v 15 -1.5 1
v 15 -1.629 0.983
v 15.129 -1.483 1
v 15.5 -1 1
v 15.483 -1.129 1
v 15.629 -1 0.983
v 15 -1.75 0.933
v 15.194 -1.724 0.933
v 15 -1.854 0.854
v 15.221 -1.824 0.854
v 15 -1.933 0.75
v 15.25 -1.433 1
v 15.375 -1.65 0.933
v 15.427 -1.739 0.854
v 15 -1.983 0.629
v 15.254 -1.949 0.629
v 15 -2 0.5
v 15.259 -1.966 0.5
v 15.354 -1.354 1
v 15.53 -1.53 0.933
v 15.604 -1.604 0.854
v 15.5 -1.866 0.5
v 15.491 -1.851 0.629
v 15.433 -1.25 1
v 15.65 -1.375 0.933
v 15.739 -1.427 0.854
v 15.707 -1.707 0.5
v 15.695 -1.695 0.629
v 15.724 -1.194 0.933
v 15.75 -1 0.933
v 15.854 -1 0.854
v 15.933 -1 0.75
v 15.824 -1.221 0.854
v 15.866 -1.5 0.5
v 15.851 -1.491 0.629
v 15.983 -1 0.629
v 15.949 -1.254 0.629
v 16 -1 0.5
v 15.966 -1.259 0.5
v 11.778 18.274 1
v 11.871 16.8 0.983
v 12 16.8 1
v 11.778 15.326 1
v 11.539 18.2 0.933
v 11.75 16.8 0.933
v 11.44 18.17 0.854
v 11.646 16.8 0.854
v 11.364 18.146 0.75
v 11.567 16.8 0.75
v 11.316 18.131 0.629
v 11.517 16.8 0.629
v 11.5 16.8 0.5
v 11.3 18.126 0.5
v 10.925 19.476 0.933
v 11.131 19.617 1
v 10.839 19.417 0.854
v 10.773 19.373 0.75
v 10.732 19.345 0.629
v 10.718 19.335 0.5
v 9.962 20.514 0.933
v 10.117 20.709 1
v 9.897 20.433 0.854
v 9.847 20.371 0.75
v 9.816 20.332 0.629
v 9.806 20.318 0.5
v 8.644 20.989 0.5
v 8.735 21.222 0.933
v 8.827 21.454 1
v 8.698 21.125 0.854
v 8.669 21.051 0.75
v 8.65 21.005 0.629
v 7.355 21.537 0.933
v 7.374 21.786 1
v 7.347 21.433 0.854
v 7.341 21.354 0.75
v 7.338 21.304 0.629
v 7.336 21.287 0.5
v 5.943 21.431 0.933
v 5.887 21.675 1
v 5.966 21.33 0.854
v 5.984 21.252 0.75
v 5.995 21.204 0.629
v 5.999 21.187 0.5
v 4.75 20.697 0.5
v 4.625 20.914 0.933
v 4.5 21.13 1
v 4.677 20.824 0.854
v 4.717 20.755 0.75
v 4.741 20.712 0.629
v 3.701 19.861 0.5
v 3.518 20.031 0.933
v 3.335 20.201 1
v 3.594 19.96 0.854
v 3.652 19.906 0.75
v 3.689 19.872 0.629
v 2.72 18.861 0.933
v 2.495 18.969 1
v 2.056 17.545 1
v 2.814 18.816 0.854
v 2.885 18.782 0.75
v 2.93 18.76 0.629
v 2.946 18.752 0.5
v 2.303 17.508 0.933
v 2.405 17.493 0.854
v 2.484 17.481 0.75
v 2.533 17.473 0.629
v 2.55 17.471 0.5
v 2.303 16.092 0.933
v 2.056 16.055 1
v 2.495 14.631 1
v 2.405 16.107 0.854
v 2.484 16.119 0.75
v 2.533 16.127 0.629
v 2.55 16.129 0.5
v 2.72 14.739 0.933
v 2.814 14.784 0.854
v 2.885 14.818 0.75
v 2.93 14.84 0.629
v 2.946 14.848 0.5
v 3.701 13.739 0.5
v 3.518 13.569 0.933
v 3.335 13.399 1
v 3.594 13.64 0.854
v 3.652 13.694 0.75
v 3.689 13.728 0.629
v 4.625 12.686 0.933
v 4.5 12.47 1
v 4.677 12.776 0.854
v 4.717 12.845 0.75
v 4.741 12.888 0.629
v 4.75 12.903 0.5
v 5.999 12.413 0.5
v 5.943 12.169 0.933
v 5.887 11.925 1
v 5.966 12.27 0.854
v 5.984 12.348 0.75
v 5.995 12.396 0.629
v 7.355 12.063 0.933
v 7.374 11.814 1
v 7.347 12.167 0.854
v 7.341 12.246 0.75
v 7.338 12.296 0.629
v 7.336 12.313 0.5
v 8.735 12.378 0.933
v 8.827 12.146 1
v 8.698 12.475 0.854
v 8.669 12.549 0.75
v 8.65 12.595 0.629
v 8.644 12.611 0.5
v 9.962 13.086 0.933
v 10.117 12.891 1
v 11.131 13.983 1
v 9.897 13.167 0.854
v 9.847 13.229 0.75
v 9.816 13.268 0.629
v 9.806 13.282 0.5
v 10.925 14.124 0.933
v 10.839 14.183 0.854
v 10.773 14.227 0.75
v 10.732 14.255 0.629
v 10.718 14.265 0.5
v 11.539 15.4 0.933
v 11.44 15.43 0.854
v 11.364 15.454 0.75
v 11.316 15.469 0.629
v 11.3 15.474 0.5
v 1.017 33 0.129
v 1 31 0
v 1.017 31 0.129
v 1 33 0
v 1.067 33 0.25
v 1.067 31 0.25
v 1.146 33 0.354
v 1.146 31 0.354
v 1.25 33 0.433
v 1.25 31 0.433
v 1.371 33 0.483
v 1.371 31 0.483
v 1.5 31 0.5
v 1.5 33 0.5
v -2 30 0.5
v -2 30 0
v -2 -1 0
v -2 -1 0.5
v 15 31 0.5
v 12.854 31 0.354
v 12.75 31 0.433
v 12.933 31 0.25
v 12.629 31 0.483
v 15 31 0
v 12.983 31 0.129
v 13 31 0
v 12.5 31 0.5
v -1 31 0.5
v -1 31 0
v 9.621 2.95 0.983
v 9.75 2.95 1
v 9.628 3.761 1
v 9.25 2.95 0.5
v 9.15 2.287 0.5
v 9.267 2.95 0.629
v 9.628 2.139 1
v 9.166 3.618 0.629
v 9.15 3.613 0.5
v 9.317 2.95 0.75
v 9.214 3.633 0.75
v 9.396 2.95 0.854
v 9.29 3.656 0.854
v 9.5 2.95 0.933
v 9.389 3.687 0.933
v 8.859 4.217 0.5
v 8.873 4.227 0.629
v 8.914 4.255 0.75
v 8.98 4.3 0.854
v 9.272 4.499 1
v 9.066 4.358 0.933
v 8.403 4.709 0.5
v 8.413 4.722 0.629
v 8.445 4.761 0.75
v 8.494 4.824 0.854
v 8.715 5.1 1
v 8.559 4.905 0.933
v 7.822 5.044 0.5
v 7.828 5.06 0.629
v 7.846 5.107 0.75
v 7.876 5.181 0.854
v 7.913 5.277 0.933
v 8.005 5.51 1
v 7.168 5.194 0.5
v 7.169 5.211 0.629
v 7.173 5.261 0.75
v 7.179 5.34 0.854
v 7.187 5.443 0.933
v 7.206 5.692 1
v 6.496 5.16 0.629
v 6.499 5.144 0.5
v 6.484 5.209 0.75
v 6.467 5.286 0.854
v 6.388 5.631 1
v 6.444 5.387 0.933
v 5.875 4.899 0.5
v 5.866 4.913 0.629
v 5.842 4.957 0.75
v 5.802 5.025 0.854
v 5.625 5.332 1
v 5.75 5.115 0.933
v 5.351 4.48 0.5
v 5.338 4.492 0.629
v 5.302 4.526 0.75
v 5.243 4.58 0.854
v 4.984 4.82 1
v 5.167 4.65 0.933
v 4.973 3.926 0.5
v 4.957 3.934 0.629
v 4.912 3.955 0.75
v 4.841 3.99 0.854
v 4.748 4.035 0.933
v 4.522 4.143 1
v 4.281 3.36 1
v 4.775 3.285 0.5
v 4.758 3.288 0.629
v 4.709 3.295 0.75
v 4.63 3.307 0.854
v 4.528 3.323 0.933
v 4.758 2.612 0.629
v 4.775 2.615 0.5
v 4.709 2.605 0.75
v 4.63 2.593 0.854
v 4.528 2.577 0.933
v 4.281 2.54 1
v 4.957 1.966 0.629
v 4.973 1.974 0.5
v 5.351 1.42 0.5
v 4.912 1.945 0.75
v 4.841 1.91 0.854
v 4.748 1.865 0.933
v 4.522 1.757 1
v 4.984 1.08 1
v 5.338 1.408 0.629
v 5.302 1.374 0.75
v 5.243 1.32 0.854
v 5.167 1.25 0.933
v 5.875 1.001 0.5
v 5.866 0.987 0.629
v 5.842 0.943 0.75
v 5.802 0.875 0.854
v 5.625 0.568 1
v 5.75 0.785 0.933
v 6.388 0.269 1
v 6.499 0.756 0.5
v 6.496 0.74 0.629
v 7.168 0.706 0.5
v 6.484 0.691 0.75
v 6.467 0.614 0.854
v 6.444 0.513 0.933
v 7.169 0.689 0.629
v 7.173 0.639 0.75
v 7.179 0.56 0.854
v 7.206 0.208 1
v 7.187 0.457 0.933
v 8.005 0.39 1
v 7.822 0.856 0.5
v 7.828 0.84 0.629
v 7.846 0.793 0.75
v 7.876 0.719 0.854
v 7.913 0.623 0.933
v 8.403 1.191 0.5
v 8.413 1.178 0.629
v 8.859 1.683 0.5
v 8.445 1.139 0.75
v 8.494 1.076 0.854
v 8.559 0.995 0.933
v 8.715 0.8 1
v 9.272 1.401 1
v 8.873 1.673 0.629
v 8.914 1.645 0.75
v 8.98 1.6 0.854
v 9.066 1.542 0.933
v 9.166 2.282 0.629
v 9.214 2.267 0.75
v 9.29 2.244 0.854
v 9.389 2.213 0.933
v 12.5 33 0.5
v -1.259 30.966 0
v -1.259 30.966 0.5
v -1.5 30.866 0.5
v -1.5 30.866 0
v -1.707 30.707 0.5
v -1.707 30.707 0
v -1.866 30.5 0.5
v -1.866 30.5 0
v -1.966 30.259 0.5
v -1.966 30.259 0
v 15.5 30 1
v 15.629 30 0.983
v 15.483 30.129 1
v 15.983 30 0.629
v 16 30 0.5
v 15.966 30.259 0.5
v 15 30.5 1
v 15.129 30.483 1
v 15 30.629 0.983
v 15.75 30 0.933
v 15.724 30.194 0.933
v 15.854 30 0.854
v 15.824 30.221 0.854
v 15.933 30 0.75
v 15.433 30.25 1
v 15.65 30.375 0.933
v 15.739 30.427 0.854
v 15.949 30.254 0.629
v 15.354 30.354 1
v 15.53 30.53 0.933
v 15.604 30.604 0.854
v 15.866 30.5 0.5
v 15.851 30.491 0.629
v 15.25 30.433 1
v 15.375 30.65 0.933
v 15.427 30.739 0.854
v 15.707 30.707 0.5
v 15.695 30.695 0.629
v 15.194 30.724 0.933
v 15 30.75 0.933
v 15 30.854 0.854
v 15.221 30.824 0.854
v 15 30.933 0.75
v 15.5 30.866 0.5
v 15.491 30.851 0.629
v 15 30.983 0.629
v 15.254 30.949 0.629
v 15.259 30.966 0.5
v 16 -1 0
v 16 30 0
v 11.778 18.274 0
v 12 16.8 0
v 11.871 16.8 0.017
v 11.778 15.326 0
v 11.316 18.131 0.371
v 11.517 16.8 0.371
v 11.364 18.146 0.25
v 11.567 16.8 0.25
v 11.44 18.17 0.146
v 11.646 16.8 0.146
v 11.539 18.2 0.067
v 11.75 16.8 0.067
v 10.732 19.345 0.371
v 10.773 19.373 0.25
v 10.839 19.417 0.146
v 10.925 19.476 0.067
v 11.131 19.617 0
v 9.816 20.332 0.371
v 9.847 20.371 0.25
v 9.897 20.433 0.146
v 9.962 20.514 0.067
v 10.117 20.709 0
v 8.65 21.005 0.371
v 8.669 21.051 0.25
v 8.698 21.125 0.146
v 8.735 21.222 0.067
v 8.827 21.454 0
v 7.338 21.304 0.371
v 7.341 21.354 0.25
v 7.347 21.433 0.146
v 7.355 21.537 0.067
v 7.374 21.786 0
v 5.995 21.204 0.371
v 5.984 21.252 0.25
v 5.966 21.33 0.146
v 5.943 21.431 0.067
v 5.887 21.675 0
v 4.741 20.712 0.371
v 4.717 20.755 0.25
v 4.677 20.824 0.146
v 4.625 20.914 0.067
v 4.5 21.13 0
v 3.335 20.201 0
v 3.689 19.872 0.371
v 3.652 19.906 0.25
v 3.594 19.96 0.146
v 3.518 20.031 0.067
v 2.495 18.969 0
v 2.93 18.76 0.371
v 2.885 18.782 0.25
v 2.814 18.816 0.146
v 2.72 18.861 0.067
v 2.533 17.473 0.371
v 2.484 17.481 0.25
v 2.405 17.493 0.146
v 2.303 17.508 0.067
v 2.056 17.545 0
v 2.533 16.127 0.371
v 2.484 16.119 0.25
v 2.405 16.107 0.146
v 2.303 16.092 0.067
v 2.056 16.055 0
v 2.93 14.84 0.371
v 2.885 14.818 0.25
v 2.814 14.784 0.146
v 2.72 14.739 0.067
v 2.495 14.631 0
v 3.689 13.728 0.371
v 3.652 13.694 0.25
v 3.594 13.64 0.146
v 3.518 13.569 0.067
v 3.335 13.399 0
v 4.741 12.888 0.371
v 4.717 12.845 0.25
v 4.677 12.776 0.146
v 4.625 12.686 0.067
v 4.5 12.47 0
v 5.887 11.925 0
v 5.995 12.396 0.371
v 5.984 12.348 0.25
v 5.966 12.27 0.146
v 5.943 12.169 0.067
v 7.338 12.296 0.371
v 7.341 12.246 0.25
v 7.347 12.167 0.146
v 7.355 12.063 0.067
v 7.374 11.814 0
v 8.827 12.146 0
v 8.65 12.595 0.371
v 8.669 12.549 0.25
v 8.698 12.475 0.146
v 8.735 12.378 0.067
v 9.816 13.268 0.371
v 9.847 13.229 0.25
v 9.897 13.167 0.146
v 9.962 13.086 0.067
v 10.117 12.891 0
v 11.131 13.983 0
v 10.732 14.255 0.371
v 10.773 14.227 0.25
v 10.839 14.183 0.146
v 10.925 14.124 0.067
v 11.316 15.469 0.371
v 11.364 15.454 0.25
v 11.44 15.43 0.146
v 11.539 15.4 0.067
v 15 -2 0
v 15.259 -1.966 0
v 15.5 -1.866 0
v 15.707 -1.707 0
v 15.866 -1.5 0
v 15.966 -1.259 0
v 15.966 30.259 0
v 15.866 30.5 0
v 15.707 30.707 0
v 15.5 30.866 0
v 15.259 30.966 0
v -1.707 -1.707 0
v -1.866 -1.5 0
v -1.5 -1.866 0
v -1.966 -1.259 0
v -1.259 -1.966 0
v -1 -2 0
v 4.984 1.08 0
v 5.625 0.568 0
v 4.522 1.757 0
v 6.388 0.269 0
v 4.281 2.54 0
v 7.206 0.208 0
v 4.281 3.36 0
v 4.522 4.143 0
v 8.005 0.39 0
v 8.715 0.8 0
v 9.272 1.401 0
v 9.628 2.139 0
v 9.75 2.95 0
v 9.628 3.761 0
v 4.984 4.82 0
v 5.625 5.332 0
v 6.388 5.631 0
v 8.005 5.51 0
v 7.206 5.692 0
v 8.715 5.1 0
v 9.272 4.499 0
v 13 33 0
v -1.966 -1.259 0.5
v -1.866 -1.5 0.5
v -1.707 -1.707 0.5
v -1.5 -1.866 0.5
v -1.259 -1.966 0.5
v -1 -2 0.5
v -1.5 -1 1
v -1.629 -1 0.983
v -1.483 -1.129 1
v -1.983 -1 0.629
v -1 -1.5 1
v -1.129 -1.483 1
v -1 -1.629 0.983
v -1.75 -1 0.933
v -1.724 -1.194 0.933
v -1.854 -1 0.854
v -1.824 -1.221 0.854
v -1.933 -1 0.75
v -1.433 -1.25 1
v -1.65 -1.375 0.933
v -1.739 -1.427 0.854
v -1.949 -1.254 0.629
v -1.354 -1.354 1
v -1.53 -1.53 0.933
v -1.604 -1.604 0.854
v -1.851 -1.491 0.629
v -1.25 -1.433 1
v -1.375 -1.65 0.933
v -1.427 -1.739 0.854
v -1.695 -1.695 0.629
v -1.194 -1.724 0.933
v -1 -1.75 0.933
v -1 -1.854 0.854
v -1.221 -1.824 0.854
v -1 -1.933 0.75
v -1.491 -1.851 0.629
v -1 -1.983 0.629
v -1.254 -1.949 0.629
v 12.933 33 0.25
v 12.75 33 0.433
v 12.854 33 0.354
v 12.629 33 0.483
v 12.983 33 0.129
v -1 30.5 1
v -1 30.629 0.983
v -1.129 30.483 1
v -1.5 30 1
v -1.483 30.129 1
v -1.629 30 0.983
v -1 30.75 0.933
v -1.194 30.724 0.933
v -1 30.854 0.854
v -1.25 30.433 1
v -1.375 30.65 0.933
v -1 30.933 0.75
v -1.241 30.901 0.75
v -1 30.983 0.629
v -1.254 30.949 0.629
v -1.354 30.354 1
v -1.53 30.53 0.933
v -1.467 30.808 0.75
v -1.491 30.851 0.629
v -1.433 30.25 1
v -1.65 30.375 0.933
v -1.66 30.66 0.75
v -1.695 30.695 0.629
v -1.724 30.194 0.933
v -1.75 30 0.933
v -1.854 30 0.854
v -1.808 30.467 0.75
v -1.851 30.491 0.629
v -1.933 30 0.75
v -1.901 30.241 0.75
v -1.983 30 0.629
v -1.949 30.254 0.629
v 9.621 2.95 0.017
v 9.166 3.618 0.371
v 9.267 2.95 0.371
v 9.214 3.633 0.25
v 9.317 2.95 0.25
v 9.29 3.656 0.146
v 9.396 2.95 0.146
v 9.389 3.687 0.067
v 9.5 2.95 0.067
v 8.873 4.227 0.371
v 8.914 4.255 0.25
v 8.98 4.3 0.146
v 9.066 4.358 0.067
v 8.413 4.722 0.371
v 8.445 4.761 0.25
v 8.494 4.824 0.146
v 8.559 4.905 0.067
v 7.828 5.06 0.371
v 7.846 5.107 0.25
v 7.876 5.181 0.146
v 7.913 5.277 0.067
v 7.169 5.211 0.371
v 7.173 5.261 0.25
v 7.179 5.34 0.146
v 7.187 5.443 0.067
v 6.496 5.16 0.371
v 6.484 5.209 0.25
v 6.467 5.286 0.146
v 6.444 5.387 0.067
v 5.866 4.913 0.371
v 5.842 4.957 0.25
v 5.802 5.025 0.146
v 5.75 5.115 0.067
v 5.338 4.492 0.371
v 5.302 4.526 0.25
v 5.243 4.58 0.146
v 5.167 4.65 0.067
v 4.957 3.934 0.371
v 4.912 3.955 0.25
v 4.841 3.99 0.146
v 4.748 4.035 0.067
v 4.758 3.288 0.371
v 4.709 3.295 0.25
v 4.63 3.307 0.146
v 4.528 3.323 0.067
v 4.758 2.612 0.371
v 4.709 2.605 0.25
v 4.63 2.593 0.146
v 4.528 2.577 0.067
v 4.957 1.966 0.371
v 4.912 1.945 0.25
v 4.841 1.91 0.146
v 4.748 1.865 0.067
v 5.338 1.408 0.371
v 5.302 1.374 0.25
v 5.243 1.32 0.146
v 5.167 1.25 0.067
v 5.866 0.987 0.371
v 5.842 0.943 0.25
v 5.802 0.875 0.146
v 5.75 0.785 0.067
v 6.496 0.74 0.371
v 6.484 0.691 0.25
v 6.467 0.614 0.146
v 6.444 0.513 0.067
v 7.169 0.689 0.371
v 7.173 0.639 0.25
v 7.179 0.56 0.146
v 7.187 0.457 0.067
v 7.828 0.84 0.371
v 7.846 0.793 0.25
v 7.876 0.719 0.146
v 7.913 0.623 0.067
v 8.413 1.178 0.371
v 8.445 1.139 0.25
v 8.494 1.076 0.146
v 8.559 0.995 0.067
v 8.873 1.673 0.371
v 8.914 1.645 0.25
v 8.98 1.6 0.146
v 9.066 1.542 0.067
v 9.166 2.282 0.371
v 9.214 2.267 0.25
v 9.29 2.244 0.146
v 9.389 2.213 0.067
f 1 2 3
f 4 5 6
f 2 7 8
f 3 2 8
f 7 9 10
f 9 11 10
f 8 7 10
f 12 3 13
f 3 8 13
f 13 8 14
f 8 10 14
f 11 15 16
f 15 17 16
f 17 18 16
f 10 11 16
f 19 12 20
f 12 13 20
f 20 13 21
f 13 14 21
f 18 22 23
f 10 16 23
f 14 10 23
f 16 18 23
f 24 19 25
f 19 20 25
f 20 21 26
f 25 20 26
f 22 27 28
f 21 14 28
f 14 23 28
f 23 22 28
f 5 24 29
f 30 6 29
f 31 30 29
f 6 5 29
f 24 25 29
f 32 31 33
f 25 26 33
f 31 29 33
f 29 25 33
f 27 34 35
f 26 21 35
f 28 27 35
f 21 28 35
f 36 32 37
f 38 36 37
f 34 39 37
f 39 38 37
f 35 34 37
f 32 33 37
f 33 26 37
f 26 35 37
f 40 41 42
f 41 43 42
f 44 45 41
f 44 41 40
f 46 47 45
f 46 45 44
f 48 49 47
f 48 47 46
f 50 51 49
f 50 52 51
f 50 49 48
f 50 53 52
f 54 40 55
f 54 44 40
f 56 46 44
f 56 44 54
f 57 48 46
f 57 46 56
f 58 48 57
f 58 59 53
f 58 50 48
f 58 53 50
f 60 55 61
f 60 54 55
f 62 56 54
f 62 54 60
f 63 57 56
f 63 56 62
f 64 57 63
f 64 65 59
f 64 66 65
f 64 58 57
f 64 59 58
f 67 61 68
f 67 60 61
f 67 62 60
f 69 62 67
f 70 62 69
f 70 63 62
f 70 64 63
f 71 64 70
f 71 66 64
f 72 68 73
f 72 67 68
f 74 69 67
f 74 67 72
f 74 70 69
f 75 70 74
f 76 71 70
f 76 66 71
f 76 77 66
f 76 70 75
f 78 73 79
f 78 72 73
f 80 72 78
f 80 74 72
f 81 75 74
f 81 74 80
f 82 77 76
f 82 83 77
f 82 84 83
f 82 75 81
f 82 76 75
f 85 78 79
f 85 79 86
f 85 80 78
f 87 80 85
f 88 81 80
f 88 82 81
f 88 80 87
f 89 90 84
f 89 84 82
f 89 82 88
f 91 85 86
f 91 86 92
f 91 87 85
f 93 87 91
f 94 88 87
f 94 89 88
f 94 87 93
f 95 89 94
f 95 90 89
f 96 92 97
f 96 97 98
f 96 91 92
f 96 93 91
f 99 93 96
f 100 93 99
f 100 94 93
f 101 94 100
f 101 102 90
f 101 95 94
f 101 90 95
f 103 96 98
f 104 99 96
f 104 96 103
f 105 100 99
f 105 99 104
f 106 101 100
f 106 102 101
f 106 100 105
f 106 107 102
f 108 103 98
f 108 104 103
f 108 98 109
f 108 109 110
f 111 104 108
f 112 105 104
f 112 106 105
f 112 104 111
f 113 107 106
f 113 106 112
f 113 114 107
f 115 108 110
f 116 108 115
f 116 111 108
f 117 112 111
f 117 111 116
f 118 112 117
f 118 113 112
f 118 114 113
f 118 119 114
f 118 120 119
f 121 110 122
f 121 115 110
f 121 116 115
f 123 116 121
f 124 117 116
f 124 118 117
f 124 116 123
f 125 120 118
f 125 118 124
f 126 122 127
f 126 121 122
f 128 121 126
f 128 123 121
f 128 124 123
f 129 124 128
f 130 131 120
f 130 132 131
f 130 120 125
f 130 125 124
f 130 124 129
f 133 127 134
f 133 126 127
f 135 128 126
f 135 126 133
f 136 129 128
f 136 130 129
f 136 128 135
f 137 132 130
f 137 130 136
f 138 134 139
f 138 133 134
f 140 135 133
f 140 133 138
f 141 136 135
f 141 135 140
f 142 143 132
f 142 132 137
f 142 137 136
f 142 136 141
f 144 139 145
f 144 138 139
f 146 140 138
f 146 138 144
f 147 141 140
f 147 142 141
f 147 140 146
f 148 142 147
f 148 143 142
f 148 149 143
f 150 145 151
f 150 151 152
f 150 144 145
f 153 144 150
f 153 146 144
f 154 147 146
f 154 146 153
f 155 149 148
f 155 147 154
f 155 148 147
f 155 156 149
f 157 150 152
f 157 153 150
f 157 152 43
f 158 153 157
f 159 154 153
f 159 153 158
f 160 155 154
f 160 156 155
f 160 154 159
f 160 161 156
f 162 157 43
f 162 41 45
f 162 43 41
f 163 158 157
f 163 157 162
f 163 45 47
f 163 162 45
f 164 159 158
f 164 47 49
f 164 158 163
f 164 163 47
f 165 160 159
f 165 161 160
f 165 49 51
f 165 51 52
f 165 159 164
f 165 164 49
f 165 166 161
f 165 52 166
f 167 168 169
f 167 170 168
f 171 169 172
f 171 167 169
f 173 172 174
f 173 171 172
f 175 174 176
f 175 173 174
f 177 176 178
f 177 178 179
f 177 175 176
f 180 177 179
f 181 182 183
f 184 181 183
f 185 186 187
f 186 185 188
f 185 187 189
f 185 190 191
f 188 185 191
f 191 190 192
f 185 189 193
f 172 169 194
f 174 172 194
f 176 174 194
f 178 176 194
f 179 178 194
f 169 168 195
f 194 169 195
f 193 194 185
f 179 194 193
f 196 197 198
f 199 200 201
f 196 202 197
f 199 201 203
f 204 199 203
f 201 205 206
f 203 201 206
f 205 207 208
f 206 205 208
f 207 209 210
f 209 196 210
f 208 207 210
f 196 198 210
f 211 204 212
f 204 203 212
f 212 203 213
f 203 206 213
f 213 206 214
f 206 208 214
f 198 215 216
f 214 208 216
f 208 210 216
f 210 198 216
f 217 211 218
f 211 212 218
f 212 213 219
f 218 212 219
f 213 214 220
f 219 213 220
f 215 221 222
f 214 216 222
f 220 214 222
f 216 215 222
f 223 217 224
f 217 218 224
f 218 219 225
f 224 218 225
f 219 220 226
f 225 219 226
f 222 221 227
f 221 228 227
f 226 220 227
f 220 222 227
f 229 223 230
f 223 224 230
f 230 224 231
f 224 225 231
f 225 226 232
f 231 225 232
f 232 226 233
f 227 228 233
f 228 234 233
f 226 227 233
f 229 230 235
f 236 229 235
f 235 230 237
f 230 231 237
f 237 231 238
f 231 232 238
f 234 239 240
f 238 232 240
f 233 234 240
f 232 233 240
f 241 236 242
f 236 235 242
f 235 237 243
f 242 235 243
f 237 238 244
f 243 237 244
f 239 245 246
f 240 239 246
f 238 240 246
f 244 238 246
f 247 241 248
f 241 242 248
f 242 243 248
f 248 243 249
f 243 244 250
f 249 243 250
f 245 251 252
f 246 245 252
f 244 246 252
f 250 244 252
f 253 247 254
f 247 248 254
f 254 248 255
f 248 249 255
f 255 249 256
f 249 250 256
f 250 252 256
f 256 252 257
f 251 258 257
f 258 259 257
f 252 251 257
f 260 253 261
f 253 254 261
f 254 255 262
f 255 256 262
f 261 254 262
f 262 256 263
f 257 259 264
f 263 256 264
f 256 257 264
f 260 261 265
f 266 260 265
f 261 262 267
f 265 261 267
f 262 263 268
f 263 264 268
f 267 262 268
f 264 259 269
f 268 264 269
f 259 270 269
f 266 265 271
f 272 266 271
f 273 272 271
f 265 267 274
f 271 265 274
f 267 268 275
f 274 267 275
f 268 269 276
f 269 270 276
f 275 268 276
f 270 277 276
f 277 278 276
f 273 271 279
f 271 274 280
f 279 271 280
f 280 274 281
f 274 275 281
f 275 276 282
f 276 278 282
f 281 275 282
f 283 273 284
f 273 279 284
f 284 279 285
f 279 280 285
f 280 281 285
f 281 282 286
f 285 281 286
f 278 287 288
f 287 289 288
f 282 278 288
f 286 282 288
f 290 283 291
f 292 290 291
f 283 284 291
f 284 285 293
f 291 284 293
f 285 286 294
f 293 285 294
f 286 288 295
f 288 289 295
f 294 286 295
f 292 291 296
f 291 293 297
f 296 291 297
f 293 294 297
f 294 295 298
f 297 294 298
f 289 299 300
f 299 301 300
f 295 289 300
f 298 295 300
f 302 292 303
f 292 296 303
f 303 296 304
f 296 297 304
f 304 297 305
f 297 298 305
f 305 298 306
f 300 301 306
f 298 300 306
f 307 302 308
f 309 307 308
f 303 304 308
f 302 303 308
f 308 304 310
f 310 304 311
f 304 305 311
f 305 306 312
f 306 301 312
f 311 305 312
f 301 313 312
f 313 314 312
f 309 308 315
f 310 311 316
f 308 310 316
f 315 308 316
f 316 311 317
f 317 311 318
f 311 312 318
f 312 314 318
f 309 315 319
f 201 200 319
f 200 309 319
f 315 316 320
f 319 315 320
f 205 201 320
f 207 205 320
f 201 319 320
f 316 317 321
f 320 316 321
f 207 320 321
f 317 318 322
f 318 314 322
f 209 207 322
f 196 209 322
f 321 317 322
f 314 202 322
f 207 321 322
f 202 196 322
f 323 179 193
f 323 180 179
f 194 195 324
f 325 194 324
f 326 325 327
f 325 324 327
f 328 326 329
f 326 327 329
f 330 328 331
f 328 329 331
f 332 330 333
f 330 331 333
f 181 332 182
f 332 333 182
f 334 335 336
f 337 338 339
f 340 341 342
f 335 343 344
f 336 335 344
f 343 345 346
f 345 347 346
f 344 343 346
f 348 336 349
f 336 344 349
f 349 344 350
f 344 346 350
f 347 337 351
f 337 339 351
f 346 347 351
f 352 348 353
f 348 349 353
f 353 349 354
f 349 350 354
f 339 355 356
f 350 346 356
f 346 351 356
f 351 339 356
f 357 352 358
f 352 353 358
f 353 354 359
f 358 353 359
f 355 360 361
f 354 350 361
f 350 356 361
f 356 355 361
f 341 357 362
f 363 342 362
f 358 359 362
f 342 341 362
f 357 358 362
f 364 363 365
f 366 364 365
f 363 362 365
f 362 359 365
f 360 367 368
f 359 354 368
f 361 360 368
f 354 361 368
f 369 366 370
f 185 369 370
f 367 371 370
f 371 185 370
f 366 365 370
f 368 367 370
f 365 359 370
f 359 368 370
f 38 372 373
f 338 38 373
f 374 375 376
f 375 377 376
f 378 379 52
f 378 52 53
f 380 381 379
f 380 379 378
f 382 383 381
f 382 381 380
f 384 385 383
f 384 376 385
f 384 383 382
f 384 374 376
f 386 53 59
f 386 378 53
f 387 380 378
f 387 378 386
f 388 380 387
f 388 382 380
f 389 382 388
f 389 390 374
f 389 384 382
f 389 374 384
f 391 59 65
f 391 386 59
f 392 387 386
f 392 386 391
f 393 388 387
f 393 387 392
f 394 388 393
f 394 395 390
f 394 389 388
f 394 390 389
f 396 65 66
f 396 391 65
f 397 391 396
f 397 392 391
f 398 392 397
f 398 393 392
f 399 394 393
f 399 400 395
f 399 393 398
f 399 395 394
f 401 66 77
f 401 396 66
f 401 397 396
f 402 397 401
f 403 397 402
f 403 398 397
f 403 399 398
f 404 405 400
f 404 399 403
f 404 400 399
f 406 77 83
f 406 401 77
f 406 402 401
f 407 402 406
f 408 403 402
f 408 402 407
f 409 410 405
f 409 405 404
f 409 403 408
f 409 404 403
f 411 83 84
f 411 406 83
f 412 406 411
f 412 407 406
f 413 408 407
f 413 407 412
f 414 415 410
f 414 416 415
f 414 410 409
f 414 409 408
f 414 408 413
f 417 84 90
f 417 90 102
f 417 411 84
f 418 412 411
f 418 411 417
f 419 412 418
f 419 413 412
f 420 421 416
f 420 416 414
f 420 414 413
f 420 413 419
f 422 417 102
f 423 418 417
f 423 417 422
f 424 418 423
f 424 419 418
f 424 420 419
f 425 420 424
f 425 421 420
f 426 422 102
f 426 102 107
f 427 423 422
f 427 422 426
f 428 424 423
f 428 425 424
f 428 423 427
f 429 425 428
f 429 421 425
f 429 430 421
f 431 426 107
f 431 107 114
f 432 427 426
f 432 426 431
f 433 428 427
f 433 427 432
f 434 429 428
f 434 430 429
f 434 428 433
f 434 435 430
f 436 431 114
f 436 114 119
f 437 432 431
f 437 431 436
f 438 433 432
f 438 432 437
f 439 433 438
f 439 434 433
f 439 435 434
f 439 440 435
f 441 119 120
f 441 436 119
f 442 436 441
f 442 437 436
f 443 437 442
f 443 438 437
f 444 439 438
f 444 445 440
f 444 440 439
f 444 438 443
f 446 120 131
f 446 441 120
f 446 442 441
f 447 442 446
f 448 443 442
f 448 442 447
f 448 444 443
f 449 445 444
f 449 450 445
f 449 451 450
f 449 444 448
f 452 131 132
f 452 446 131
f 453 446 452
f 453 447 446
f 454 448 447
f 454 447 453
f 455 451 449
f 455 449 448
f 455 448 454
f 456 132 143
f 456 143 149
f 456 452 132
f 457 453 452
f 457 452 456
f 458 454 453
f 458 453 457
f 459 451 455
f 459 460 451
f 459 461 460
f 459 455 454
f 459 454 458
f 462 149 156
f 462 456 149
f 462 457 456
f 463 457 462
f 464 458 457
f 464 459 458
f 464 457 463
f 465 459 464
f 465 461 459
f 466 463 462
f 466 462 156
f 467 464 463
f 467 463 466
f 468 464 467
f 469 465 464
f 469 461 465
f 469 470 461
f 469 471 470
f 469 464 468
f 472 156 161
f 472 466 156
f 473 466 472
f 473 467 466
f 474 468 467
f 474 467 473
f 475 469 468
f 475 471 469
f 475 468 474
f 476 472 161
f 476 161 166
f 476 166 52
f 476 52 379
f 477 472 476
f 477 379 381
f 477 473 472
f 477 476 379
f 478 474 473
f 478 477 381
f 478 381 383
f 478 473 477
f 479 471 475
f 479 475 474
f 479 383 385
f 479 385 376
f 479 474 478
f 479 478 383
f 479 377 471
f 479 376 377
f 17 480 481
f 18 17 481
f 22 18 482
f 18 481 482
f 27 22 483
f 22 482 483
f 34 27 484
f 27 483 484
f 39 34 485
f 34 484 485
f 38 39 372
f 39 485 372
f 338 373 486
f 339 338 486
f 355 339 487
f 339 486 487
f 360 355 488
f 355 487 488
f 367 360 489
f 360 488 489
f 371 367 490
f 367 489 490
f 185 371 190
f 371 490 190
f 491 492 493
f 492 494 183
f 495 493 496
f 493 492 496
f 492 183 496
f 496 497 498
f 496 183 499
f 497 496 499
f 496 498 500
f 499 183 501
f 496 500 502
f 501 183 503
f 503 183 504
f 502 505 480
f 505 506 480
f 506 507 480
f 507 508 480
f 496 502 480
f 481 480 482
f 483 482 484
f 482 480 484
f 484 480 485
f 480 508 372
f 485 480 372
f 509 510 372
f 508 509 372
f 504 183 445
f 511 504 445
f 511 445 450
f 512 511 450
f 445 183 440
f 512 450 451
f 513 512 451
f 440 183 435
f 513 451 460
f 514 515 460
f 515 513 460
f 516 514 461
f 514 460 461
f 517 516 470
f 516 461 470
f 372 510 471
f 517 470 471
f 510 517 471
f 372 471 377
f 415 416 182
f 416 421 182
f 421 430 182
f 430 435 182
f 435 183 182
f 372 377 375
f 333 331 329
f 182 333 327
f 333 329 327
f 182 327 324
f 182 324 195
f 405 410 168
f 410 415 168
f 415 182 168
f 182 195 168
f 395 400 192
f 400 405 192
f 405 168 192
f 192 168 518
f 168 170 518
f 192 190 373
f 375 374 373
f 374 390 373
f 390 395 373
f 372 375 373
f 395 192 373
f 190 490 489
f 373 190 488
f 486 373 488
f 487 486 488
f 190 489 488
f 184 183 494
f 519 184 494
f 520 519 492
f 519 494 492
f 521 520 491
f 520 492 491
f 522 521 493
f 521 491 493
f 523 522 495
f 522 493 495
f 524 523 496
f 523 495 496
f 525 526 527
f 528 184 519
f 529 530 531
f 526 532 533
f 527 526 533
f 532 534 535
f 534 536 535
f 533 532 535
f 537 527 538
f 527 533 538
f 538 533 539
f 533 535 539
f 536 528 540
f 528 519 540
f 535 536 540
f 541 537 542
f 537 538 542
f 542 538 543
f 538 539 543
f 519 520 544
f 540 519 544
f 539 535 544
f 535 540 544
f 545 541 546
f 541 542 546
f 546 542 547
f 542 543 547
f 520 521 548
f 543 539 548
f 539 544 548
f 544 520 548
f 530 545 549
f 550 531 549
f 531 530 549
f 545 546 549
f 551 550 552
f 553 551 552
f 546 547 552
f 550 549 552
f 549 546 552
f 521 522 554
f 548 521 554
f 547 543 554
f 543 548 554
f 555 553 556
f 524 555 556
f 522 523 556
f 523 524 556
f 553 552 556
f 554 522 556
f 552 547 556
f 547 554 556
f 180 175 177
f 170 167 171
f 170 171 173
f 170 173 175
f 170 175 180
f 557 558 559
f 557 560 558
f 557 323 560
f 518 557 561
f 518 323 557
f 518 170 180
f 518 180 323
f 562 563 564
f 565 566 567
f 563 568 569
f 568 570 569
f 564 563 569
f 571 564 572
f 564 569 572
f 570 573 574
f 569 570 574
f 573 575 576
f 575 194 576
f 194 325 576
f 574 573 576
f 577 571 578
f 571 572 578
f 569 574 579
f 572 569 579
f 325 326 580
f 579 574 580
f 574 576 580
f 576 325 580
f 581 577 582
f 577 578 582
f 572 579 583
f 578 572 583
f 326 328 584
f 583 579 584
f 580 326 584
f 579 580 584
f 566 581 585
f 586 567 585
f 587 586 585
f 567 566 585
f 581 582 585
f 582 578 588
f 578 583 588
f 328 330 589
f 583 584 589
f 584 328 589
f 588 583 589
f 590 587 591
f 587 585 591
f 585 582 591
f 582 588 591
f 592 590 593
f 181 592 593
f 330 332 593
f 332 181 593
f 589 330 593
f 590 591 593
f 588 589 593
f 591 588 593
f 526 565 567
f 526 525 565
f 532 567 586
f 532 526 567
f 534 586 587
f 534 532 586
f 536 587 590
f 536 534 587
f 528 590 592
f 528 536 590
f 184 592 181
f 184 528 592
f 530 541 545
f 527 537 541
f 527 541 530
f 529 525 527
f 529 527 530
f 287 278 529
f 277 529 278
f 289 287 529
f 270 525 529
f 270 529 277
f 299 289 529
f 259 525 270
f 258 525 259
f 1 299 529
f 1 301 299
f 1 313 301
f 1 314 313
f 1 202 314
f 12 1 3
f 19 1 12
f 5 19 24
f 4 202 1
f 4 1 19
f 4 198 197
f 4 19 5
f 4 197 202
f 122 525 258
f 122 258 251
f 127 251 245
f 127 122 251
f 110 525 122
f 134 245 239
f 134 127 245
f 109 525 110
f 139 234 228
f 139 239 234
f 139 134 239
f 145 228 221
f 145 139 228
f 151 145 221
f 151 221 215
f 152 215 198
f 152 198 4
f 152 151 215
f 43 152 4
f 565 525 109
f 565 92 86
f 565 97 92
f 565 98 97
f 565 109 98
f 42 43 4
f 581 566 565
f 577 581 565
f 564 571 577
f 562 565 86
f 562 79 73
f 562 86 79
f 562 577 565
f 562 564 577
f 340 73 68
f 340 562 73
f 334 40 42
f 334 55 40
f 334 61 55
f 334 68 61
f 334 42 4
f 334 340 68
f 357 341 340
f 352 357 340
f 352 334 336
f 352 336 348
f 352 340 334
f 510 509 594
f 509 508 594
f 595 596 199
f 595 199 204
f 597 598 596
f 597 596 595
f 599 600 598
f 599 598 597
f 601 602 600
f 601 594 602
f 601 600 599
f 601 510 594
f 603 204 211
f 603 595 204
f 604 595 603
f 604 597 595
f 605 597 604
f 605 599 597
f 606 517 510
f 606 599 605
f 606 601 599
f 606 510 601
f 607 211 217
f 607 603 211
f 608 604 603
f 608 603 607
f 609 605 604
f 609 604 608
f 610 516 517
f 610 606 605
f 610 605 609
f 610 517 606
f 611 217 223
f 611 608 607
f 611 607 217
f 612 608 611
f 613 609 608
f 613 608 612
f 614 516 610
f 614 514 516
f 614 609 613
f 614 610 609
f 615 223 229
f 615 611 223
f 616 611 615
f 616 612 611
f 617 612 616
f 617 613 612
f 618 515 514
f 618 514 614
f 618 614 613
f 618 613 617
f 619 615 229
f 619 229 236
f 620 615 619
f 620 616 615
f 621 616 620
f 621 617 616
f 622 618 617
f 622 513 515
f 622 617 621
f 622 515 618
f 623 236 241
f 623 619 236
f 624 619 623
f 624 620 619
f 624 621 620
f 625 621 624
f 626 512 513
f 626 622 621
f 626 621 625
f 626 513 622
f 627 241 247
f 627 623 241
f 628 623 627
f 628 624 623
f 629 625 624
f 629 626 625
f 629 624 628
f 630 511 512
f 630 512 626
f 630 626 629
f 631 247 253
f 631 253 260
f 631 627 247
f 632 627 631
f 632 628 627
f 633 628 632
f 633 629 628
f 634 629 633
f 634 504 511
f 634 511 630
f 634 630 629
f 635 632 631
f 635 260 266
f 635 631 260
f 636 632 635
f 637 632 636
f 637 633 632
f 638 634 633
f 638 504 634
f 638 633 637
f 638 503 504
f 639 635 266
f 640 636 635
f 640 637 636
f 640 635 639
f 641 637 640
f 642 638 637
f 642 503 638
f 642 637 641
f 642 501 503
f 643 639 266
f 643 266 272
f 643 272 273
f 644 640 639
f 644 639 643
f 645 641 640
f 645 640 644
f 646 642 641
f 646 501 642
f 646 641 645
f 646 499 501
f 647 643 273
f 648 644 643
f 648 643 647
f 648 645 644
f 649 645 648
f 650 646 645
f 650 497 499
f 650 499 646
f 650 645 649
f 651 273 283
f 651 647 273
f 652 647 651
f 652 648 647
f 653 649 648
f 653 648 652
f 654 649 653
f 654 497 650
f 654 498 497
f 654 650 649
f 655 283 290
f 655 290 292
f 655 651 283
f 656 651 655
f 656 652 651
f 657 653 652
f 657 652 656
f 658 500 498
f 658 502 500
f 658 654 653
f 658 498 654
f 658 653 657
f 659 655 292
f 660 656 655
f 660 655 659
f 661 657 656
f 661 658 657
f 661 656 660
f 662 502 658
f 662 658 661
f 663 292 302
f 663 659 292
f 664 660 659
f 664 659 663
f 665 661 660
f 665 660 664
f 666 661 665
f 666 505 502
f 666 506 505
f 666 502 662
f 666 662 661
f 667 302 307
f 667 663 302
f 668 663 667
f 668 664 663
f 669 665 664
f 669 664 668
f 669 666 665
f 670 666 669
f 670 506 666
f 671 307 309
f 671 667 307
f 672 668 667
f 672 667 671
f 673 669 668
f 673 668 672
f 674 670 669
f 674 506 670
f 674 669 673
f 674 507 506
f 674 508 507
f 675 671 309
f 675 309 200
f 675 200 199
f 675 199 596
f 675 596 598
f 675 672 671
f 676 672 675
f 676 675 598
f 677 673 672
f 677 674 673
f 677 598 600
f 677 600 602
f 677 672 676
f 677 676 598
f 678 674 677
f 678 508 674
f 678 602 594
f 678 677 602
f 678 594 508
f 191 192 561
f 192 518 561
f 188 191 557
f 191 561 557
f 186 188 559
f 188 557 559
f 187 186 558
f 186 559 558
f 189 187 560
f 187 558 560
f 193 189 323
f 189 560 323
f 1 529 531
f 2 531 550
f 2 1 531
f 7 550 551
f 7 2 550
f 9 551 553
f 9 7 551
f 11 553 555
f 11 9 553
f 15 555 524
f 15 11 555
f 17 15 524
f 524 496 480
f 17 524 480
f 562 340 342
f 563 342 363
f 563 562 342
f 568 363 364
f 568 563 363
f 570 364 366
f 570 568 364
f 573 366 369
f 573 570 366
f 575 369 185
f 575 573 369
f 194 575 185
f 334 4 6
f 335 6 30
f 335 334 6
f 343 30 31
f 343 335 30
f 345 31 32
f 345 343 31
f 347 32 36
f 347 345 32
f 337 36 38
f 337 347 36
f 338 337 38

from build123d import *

# Parameters (mm, degrees)
F0_R     = 2.25
F0_R_2   = 4.5
F1_DEPTH = 1
F2_R     = 0.5
F0_W     = 12
F0_H     = 2
F3_DEPTH = 0.5
F4_R     = 0.49999
F5_R     = 0.49999


# Not quite as in the source:
# - a fillet or chamfer is up to 0.001 mm smaller than in the source, because OpenCascade refuses the exact size


with BuildPart() as f1:
    # F0 (on Top) → F1 (new body)
    with BuildSketch(Plane.XY):
        with BuildLine():
            ThreePointArc((-2, -1), (-1.7071067812, -1.7071067812), (-1, -2))
            Line((-1, -2), (15, -2))
            ThreePointArc((15, -2), (15.7071067812, -1.7071067812), (16, -1))
            Line((16, -1), (16, 30))
            ThreePointArc((16, 30), (15.7071067812, 30.7071067812), (15, 31))
            Line((15, 31), (13, 31))
            Line((13, 31), (1, 31))
            Line((1, 31), (-1, 31))
            ThreePointArc((-1, 31), (-1.7071067812, 30.7071067812), (-2, 30))
            Line((-2, 30), (-2, -1))
        make_face()
        with Locations((7, 2.95)):
            Circle(F0_R, mode=Mode.SUBTRACT)
        with Locations((7, 16.8)):
            Circle(F0_R_2, mode=Mode.SUBTRACT)
    extrude(amount=F1_DEPTH)

    # F2
    f2_edges = [f1.edges().sort_by_distance(p)[0] for p in [
        (2.5, 16.8, 0),
        (4.75, 2.95, 0),
    ]]
    fillet(f2_edges, radius=F2_R)

    # F0 (on Top) → F3 (join)
    with BuildSketch(Plane.XY):
        with Locations((7, 32)):
            Rectangle(F0_W, F0_H)
    extrude(amount=F3_DEPTH)

    # F4 (radius 0.5 in the source; OpenCascade refuses exactly that, so slightly less here)
    f4_edges = [f1.edges().sort_by_distance(p)[0] for p in [
        (-2, 14.5, 1),
        (-1.707107, -1.707107, 1),
        (7, -2, 1),
        (15.707107, -1.707107, 1),
        (16, 14.5, 1),
        (15.707107, 30.707107, 1),
        (7, 31, 1),
        (-1.707107, 30.707107, 1),
        (4.75, 2.95, 1),
        (2.5, 16.8, 1),
    ]]
    fillet(f4_edges, radius=F4_R)

    # F5 (radius 0.5 in the source; OpenCascade refuses exactly that, so slightly less here)
    f5_edges = [f1.edges().sort_by_distance(p)[0] for p in [
        (1, 32, 0.5),
        (13, 32, 0.5),
    ]]
    fillet(f5_edges, radius=F5_R)


solid = f1.part
